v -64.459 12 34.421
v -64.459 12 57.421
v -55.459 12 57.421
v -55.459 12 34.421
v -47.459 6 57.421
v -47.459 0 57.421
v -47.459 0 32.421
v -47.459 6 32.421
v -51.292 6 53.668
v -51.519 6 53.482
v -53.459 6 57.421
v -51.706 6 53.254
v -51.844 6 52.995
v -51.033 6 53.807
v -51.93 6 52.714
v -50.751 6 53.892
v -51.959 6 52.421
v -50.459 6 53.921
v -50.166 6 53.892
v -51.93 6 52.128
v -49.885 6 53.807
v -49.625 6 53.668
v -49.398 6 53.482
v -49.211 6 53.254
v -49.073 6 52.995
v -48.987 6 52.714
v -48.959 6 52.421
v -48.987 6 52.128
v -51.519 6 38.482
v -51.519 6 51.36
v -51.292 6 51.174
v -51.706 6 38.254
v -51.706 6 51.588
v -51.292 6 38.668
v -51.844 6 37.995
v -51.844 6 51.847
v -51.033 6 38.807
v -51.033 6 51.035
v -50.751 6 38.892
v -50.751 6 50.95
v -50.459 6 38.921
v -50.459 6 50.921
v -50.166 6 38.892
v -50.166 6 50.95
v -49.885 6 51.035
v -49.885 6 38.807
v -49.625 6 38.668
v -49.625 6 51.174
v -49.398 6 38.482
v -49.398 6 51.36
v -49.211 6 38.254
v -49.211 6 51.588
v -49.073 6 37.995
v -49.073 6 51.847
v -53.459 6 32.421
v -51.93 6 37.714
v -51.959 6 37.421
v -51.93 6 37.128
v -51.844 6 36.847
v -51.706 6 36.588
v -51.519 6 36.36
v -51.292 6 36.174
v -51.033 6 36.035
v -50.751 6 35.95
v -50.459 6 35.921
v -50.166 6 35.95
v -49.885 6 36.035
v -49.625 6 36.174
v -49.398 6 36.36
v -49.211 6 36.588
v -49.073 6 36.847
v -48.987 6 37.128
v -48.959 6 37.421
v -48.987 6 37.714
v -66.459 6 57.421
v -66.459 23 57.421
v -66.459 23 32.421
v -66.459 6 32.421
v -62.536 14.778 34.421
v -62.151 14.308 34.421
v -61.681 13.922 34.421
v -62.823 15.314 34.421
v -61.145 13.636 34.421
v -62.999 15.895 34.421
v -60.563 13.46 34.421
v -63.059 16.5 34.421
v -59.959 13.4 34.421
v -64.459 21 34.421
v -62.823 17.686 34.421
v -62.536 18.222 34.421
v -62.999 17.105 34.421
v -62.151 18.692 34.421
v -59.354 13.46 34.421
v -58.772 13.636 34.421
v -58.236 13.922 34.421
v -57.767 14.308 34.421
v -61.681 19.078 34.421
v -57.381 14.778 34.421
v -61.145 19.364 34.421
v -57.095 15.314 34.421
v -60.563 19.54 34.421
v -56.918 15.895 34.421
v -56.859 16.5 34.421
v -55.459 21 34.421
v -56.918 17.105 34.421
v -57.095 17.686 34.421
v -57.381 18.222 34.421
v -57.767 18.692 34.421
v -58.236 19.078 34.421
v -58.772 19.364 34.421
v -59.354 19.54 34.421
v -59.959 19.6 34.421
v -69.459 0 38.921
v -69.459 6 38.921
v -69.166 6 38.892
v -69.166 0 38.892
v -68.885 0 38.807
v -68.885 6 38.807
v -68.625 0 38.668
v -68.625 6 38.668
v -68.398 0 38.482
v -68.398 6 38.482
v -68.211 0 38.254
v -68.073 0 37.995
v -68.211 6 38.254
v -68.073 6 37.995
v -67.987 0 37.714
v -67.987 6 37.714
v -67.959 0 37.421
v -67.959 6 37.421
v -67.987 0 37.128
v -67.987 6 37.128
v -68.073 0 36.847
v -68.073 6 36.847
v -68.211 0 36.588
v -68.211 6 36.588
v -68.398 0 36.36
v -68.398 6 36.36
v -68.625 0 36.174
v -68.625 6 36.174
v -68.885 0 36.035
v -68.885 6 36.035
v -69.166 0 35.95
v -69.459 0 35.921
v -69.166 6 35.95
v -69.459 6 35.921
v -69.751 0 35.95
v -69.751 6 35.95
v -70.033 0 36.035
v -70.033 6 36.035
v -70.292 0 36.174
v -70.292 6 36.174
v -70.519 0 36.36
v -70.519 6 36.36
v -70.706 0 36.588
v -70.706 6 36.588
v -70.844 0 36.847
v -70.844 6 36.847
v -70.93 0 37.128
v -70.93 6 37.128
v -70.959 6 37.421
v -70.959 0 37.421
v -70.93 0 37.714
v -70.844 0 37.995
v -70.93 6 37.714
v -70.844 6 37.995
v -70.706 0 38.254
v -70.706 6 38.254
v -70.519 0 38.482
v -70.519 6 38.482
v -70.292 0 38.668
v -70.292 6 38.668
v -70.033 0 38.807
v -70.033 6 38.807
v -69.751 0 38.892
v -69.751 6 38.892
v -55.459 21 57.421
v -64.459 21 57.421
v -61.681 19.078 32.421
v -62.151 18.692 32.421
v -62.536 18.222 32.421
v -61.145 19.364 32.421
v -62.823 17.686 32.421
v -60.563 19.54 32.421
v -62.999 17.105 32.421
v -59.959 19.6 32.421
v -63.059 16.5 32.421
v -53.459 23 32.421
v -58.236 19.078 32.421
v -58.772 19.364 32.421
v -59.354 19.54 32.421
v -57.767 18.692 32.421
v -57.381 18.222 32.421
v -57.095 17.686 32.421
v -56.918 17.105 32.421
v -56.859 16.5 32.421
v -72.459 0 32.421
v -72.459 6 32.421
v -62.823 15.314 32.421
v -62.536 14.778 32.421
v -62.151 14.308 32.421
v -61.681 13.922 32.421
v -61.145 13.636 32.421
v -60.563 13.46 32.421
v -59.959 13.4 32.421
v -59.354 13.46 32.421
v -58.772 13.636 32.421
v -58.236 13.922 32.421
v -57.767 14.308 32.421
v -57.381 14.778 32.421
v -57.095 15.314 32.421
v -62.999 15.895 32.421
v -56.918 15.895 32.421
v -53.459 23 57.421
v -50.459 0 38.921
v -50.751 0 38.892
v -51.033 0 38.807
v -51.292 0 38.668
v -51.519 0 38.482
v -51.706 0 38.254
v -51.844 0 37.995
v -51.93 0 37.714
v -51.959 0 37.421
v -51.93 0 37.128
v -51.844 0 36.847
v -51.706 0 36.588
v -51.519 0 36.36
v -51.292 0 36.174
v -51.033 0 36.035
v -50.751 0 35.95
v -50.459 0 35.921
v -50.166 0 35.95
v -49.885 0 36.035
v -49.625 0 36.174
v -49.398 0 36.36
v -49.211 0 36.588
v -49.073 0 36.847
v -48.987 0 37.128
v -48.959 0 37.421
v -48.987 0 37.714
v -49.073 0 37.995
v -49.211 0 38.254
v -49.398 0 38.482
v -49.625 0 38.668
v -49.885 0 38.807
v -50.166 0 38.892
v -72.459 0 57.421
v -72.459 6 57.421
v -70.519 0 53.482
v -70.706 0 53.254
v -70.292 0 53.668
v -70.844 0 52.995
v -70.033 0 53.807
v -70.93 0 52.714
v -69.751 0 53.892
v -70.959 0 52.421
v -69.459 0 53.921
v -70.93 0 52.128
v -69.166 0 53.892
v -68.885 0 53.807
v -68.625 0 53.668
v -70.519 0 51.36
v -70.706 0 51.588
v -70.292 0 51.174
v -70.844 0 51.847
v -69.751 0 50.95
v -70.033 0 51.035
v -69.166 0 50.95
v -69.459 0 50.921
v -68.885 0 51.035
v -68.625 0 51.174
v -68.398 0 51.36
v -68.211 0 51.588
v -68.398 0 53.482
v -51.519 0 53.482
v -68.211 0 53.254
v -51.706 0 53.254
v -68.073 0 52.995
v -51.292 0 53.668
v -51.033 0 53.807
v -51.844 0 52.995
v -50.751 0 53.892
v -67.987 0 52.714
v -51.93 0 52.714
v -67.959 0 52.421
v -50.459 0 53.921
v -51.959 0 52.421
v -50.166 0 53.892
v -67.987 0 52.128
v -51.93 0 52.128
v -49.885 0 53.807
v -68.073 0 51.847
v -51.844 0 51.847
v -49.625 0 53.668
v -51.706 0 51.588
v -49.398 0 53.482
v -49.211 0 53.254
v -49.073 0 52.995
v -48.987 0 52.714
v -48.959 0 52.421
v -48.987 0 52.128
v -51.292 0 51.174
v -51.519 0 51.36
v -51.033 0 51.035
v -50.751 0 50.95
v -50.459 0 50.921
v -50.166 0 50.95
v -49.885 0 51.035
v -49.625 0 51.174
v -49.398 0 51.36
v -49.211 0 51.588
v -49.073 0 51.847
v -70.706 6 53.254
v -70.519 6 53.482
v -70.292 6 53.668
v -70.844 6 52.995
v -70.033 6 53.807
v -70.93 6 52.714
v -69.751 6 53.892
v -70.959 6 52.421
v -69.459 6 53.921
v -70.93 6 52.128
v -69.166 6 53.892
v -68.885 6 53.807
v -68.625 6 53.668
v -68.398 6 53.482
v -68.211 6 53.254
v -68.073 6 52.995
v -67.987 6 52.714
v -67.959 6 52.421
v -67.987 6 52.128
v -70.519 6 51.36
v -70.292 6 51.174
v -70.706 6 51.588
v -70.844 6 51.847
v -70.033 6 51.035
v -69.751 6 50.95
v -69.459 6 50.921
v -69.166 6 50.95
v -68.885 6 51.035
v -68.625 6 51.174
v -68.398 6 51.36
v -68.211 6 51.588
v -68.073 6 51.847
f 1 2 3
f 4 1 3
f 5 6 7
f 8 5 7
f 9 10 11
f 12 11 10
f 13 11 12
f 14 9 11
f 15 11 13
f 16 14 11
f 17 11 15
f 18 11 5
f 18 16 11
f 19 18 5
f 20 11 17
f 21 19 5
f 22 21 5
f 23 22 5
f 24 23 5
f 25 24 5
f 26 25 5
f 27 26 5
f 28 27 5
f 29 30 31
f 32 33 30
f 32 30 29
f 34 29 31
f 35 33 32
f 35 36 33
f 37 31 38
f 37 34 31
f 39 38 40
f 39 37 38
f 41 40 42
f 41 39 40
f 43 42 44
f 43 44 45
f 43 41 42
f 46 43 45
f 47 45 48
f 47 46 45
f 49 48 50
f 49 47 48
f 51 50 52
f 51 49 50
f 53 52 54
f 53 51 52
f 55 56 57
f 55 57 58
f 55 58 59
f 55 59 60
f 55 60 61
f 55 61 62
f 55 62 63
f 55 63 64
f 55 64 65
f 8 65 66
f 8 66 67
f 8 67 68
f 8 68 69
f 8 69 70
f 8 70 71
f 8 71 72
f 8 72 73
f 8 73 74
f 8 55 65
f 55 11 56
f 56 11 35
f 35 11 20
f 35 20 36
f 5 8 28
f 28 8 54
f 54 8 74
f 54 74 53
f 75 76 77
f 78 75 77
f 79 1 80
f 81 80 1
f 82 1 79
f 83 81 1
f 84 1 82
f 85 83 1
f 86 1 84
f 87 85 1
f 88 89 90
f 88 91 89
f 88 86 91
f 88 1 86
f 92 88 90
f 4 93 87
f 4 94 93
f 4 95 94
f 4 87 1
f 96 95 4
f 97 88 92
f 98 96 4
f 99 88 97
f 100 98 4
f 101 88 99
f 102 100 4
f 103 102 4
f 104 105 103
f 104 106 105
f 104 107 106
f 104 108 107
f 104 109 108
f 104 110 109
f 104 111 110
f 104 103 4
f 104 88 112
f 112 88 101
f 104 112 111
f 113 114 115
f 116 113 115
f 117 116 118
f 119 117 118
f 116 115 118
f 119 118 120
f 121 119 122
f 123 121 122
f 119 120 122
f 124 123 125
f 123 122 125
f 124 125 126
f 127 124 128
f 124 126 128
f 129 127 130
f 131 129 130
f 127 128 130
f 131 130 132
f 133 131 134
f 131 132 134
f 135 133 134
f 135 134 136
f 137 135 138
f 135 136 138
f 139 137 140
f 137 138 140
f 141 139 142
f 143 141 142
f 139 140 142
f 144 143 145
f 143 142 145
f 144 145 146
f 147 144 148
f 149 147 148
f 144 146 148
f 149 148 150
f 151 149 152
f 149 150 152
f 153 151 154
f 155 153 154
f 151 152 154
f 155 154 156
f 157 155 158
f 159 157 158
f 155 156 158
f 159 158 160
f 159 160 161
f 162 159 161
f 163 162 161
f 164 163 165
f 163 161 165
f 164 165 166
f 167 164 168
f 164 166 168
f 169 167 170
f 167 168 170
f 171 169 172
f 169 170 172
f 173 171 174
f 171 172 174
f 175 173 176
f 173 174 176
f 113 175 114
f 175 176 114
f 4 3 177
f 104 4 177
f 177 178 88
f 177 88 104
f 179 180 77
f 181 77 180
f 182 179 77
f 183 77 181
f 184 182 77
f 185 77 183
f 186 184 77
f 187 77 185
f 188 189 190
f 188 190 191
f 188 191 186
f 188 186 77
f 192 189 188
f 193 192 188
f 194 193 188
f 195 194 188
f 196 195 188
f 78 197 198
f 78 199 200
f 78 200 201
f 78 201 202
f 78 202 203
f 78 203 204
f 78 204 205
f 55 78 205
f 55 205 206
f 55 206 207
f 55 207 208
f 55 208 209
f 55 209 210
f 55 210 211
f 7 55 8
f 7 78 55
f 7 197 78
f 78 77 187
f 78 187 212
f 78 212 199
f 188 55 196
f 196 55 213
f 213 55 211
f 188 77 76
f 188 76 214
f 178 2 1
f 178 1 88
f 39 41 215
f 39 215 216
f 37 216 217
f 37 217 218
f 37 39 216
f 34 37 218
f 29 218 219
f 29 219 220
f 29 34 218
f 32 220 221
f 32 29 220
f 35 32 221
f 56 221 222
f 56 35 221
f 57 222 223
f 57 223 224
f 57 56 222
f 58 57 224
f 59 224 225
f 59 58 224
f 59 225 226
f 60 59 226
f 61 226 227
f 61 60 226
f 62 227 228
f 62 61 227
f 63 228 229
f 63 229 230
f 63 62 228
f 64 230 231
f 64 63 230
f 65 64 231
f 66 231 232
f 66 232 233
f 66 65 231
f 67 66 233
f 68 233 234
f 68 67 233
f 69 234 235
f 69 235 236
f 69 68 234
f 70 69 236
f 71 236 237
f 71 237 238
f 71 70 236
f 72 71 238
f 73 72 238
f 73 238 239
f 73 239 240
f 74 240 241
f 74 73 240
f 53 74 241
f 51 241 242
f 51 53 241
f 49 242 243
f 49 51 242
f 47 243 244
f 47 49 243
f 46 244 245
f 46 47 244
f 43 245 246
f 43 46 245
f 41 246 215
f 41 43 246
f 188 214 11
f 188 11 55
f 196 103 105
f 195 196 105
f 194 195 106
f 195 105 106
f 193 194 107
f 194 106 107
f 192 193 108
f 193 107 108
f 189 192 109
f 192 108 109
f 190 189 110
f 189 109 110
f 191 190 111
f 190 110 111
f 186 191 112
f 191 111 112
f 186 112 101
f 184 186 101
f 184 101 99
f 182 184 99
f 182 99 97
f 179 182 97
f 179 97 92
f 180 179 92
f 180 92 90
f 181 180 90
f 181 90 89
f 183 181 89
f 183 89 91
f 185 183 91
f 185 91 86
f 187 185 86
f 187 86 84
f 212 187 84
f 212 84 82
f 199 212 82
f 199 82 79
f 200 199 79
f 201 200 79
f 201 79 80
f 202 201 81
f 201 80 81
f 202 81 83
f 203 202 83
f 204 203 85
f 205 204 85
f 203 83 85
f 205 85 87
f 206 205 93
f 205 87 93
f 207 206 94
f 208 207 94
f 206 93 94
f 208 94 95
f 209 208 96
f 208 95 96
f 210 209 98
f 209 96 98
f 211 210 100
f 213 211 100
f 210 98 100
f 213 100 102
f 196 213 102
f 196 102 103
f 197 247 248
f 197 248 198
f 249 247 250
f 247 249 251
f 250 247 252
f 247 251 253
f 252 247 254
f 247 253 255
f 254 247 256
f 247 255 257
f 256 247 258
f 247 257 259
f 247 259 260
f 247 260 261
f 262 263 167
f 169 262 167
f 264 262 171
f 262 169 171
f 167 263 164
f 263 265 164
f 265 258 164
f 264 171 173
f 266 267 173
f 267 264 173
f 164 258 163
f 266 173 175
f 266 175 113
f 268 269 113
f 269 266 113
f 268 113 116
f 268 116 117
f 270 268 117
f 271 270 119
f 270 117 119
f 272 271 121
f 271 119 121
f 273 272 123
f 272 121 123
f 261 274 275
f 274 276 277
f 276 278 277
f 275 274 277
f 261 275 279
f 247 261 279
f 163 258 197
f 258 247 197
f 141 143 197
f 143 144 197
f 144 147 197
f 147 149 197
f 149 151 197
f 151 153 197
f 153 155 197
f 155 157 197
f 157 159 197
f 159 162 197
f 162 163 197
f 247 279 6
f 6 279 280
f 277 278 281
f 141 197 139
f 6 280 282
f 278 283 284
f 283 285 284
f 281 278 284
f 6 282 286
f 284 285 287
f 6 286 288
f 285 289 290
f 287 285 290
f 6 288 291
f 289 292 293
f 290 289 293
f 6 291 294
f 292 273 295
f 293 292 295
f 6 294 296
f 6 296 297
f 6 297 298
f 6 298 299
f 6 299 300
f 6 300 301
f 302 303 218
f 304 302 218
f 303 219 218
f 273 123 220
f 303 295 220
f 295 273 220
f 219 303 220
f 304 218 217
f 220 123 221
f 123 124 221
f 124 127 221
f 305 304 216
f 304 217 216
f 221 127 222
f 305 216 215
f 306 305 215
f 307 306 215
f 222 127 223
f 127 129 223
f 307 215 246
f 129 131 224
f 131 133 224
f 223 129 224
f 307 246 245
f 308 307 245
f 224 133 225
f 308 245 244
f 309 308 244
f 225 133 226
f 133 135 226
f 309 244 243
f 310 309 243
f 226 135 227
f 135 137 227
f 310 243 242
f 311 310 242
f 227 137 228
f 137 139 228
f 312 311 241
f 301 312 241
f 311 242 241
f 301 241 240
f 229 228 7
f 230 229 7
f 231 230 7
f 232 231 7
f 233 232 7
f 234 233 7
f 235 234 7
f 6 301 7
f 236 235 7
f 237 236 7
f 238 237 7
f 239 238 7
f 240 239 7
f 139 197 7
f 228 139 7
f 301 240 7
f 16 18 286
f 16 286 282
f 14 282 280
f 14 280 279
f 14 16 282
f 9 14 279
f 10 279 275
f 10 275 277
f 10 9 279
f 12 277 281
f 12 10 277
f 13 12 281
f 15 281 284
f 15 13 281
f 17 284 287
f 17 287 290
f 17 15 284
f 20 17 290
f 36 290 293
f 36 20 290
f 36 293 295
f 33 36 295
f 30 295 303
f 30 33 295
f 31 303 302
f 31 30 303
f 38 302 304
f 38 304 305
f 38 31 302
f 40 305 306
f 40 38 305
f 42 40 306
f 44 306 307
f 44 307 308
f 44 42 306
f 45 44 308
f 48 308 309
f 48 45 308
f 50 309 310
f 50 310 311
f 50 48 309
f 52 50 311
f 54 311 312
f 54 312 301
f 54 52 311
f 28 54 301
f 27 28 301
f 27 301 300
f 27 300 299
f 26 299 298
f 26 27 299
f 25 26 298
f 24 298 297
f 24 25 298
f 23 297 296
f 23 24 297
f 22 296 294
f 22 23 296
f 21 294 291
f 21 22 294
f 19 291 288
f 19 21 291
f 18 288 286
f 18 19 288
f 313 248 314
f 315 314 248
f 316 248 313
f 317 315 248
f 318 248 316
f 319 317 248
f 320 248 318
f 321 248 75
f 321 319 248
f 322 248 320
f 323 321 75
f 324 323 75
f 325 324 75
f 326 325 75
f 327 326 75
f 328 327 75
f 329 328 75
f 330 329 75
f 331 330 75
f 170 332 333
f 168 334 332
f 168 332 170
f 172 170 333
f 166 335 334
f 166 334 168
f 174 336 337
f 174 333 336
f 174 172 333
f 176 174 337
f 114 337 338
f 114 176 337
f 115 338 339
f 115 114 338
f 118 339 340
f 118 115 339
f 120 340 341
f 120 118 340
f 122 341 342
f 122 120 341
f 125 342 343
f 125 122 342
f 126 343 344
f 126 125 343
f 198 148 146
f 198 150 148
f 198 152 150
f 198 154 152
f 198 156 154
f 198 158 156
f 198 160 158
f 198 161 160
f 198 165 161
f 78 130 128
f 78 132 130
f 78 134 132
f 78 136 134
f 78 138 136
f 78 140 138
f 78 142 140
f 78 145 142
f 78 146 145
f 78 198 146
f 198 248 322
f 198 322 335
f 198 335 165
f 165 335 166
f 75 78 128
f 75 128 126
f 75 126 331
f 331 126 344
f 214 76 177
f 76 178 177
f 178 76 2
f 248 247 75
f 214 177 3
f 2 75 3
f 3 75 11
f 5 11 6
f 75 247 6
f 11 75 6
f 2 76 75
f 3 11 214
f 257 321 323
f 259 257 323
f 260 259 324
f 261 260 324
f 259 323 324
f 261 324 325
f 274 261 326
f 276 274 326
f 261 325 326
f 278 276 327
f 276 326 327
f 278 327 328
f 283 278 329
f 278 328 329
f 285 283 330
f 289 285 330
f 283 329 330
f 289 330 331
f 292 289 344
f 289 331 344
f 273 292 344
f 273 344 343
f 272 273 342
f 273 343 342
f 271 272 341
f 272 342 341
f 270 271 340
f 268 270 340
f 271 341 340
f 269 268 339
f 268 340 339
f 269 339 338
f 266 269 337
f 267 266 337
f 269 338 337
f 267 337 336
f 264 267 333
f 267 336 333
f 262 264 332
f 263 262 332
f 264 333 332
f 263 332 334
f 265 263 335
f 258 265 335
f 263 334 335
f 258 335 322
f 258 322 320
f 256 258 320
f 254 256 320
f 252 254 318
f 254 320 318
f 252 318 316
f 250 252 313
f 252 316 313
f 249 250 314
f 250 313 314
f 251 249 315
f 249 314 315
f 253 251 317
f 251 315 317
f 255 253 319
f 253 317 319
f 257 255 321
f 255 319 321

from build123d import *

# Parameters (mm, degrees)
SKETCH_1_W          = 25
SKETCH_1_H          = 25
EXTRUDE_1_DEPTH     = 23
SKETCH_2_W          = 6
SKETCH_2_H          = 25
CUT_EXTRUDE_1_DEPTH = 17
SKETCH_3_R          = 1.5
CUT_EXTRUDE_2_DEPTH = 6
SKETCH_7_W          = 9
SKETCH_7_H          = 9
CUT_EXTRUDE_3_DEPTH = 23
SKETCH_8_R          = 3.1
CUT_EXTRUDE_4_DEPTH = 23


with BuildPart() as part:
    # 草图1 → 凸台-拉伸1 (new body)
    with BuildSketch(Plane(origin=(0, 0, 0), x_dir=(1, 0, 0), z_dir=(0, 1, 0))):
        with Locations((-59.958661712, -44.921006296)):
            Rectangle(SKETCH_1_W, SKETCH_1_H)
    extrude(amount=EXTRUDE_1_DEPTH)

    # 草图2 → 切除-拉伸1 (cut)
    with BuildSketch(Plane(origin=(0, 23, 0), x_dir=(1, 0, 0), z_dir=(0, 1, 0))):
        with Locations((-69.458661712, -44.921006296)):
            Rectangle(SKETCH_2_W, SKETCH_2_H)
        with Locations((-50.458661712, -44.921006296)):
            Rectangle(SKETCH_2_W, SKETCH_2_H)
    extrude(amount=-CUT_EXTRUDE_1_DEPTH, mode=Mode.SUBTRACT)

    # 草图3 → 切除-拉伸2 (cut)
    with BuildSketch(Plane(origin=(0, 6, 0), x_dir=(1, 0, 0), z_dir=(0, 1, 0))):
        with Locations(Location((-69.458661712, -37.421006296, 0), (0, 0, 270))):
            Circle(SKETCH_3_R)
        with Locations(Location((-69.458661712, -52.421006296, 0), (0, 0, 270))):
            Circle(SKETCH_3_R)
    cut_extrude_2 = extrude(amount=-CUT_EXTRUDE_2_DEPTH, mode=Mode.SUBTRACT)

    # 镜向1: 切除-拉伸2 across plane
    add(cut_extrude_2.mirror(Plane.ZY.offset(59.958661712)), mode=Mode.SUBTRACT)

    # 草图7 → 切除-拉伸3 (cut)
    with BuildSketch(Plane.XY.offset(57.421006296)):
        with Locations((-59.958661712, 16.5)):
            Rectangle(SKETCH_7_W, SKETCH_7_H)
    extrude(amount=-CUT_EXTRUDE_3_DEPTH, mode=Mode.SUBTRACT)

    # 草图8 → 切除-拉伸4 (cut)
    with BuildSketch(Plane.XY.offset(34.421006296)):
        with Locations((-59.958661712, 16.5)):
            Circle(SKETCH_8_R)
    extrude(amount=-CUT_EXTRUDE_4_DEPTH, mode=Mode.SUBTRACT)


solid = part.part
